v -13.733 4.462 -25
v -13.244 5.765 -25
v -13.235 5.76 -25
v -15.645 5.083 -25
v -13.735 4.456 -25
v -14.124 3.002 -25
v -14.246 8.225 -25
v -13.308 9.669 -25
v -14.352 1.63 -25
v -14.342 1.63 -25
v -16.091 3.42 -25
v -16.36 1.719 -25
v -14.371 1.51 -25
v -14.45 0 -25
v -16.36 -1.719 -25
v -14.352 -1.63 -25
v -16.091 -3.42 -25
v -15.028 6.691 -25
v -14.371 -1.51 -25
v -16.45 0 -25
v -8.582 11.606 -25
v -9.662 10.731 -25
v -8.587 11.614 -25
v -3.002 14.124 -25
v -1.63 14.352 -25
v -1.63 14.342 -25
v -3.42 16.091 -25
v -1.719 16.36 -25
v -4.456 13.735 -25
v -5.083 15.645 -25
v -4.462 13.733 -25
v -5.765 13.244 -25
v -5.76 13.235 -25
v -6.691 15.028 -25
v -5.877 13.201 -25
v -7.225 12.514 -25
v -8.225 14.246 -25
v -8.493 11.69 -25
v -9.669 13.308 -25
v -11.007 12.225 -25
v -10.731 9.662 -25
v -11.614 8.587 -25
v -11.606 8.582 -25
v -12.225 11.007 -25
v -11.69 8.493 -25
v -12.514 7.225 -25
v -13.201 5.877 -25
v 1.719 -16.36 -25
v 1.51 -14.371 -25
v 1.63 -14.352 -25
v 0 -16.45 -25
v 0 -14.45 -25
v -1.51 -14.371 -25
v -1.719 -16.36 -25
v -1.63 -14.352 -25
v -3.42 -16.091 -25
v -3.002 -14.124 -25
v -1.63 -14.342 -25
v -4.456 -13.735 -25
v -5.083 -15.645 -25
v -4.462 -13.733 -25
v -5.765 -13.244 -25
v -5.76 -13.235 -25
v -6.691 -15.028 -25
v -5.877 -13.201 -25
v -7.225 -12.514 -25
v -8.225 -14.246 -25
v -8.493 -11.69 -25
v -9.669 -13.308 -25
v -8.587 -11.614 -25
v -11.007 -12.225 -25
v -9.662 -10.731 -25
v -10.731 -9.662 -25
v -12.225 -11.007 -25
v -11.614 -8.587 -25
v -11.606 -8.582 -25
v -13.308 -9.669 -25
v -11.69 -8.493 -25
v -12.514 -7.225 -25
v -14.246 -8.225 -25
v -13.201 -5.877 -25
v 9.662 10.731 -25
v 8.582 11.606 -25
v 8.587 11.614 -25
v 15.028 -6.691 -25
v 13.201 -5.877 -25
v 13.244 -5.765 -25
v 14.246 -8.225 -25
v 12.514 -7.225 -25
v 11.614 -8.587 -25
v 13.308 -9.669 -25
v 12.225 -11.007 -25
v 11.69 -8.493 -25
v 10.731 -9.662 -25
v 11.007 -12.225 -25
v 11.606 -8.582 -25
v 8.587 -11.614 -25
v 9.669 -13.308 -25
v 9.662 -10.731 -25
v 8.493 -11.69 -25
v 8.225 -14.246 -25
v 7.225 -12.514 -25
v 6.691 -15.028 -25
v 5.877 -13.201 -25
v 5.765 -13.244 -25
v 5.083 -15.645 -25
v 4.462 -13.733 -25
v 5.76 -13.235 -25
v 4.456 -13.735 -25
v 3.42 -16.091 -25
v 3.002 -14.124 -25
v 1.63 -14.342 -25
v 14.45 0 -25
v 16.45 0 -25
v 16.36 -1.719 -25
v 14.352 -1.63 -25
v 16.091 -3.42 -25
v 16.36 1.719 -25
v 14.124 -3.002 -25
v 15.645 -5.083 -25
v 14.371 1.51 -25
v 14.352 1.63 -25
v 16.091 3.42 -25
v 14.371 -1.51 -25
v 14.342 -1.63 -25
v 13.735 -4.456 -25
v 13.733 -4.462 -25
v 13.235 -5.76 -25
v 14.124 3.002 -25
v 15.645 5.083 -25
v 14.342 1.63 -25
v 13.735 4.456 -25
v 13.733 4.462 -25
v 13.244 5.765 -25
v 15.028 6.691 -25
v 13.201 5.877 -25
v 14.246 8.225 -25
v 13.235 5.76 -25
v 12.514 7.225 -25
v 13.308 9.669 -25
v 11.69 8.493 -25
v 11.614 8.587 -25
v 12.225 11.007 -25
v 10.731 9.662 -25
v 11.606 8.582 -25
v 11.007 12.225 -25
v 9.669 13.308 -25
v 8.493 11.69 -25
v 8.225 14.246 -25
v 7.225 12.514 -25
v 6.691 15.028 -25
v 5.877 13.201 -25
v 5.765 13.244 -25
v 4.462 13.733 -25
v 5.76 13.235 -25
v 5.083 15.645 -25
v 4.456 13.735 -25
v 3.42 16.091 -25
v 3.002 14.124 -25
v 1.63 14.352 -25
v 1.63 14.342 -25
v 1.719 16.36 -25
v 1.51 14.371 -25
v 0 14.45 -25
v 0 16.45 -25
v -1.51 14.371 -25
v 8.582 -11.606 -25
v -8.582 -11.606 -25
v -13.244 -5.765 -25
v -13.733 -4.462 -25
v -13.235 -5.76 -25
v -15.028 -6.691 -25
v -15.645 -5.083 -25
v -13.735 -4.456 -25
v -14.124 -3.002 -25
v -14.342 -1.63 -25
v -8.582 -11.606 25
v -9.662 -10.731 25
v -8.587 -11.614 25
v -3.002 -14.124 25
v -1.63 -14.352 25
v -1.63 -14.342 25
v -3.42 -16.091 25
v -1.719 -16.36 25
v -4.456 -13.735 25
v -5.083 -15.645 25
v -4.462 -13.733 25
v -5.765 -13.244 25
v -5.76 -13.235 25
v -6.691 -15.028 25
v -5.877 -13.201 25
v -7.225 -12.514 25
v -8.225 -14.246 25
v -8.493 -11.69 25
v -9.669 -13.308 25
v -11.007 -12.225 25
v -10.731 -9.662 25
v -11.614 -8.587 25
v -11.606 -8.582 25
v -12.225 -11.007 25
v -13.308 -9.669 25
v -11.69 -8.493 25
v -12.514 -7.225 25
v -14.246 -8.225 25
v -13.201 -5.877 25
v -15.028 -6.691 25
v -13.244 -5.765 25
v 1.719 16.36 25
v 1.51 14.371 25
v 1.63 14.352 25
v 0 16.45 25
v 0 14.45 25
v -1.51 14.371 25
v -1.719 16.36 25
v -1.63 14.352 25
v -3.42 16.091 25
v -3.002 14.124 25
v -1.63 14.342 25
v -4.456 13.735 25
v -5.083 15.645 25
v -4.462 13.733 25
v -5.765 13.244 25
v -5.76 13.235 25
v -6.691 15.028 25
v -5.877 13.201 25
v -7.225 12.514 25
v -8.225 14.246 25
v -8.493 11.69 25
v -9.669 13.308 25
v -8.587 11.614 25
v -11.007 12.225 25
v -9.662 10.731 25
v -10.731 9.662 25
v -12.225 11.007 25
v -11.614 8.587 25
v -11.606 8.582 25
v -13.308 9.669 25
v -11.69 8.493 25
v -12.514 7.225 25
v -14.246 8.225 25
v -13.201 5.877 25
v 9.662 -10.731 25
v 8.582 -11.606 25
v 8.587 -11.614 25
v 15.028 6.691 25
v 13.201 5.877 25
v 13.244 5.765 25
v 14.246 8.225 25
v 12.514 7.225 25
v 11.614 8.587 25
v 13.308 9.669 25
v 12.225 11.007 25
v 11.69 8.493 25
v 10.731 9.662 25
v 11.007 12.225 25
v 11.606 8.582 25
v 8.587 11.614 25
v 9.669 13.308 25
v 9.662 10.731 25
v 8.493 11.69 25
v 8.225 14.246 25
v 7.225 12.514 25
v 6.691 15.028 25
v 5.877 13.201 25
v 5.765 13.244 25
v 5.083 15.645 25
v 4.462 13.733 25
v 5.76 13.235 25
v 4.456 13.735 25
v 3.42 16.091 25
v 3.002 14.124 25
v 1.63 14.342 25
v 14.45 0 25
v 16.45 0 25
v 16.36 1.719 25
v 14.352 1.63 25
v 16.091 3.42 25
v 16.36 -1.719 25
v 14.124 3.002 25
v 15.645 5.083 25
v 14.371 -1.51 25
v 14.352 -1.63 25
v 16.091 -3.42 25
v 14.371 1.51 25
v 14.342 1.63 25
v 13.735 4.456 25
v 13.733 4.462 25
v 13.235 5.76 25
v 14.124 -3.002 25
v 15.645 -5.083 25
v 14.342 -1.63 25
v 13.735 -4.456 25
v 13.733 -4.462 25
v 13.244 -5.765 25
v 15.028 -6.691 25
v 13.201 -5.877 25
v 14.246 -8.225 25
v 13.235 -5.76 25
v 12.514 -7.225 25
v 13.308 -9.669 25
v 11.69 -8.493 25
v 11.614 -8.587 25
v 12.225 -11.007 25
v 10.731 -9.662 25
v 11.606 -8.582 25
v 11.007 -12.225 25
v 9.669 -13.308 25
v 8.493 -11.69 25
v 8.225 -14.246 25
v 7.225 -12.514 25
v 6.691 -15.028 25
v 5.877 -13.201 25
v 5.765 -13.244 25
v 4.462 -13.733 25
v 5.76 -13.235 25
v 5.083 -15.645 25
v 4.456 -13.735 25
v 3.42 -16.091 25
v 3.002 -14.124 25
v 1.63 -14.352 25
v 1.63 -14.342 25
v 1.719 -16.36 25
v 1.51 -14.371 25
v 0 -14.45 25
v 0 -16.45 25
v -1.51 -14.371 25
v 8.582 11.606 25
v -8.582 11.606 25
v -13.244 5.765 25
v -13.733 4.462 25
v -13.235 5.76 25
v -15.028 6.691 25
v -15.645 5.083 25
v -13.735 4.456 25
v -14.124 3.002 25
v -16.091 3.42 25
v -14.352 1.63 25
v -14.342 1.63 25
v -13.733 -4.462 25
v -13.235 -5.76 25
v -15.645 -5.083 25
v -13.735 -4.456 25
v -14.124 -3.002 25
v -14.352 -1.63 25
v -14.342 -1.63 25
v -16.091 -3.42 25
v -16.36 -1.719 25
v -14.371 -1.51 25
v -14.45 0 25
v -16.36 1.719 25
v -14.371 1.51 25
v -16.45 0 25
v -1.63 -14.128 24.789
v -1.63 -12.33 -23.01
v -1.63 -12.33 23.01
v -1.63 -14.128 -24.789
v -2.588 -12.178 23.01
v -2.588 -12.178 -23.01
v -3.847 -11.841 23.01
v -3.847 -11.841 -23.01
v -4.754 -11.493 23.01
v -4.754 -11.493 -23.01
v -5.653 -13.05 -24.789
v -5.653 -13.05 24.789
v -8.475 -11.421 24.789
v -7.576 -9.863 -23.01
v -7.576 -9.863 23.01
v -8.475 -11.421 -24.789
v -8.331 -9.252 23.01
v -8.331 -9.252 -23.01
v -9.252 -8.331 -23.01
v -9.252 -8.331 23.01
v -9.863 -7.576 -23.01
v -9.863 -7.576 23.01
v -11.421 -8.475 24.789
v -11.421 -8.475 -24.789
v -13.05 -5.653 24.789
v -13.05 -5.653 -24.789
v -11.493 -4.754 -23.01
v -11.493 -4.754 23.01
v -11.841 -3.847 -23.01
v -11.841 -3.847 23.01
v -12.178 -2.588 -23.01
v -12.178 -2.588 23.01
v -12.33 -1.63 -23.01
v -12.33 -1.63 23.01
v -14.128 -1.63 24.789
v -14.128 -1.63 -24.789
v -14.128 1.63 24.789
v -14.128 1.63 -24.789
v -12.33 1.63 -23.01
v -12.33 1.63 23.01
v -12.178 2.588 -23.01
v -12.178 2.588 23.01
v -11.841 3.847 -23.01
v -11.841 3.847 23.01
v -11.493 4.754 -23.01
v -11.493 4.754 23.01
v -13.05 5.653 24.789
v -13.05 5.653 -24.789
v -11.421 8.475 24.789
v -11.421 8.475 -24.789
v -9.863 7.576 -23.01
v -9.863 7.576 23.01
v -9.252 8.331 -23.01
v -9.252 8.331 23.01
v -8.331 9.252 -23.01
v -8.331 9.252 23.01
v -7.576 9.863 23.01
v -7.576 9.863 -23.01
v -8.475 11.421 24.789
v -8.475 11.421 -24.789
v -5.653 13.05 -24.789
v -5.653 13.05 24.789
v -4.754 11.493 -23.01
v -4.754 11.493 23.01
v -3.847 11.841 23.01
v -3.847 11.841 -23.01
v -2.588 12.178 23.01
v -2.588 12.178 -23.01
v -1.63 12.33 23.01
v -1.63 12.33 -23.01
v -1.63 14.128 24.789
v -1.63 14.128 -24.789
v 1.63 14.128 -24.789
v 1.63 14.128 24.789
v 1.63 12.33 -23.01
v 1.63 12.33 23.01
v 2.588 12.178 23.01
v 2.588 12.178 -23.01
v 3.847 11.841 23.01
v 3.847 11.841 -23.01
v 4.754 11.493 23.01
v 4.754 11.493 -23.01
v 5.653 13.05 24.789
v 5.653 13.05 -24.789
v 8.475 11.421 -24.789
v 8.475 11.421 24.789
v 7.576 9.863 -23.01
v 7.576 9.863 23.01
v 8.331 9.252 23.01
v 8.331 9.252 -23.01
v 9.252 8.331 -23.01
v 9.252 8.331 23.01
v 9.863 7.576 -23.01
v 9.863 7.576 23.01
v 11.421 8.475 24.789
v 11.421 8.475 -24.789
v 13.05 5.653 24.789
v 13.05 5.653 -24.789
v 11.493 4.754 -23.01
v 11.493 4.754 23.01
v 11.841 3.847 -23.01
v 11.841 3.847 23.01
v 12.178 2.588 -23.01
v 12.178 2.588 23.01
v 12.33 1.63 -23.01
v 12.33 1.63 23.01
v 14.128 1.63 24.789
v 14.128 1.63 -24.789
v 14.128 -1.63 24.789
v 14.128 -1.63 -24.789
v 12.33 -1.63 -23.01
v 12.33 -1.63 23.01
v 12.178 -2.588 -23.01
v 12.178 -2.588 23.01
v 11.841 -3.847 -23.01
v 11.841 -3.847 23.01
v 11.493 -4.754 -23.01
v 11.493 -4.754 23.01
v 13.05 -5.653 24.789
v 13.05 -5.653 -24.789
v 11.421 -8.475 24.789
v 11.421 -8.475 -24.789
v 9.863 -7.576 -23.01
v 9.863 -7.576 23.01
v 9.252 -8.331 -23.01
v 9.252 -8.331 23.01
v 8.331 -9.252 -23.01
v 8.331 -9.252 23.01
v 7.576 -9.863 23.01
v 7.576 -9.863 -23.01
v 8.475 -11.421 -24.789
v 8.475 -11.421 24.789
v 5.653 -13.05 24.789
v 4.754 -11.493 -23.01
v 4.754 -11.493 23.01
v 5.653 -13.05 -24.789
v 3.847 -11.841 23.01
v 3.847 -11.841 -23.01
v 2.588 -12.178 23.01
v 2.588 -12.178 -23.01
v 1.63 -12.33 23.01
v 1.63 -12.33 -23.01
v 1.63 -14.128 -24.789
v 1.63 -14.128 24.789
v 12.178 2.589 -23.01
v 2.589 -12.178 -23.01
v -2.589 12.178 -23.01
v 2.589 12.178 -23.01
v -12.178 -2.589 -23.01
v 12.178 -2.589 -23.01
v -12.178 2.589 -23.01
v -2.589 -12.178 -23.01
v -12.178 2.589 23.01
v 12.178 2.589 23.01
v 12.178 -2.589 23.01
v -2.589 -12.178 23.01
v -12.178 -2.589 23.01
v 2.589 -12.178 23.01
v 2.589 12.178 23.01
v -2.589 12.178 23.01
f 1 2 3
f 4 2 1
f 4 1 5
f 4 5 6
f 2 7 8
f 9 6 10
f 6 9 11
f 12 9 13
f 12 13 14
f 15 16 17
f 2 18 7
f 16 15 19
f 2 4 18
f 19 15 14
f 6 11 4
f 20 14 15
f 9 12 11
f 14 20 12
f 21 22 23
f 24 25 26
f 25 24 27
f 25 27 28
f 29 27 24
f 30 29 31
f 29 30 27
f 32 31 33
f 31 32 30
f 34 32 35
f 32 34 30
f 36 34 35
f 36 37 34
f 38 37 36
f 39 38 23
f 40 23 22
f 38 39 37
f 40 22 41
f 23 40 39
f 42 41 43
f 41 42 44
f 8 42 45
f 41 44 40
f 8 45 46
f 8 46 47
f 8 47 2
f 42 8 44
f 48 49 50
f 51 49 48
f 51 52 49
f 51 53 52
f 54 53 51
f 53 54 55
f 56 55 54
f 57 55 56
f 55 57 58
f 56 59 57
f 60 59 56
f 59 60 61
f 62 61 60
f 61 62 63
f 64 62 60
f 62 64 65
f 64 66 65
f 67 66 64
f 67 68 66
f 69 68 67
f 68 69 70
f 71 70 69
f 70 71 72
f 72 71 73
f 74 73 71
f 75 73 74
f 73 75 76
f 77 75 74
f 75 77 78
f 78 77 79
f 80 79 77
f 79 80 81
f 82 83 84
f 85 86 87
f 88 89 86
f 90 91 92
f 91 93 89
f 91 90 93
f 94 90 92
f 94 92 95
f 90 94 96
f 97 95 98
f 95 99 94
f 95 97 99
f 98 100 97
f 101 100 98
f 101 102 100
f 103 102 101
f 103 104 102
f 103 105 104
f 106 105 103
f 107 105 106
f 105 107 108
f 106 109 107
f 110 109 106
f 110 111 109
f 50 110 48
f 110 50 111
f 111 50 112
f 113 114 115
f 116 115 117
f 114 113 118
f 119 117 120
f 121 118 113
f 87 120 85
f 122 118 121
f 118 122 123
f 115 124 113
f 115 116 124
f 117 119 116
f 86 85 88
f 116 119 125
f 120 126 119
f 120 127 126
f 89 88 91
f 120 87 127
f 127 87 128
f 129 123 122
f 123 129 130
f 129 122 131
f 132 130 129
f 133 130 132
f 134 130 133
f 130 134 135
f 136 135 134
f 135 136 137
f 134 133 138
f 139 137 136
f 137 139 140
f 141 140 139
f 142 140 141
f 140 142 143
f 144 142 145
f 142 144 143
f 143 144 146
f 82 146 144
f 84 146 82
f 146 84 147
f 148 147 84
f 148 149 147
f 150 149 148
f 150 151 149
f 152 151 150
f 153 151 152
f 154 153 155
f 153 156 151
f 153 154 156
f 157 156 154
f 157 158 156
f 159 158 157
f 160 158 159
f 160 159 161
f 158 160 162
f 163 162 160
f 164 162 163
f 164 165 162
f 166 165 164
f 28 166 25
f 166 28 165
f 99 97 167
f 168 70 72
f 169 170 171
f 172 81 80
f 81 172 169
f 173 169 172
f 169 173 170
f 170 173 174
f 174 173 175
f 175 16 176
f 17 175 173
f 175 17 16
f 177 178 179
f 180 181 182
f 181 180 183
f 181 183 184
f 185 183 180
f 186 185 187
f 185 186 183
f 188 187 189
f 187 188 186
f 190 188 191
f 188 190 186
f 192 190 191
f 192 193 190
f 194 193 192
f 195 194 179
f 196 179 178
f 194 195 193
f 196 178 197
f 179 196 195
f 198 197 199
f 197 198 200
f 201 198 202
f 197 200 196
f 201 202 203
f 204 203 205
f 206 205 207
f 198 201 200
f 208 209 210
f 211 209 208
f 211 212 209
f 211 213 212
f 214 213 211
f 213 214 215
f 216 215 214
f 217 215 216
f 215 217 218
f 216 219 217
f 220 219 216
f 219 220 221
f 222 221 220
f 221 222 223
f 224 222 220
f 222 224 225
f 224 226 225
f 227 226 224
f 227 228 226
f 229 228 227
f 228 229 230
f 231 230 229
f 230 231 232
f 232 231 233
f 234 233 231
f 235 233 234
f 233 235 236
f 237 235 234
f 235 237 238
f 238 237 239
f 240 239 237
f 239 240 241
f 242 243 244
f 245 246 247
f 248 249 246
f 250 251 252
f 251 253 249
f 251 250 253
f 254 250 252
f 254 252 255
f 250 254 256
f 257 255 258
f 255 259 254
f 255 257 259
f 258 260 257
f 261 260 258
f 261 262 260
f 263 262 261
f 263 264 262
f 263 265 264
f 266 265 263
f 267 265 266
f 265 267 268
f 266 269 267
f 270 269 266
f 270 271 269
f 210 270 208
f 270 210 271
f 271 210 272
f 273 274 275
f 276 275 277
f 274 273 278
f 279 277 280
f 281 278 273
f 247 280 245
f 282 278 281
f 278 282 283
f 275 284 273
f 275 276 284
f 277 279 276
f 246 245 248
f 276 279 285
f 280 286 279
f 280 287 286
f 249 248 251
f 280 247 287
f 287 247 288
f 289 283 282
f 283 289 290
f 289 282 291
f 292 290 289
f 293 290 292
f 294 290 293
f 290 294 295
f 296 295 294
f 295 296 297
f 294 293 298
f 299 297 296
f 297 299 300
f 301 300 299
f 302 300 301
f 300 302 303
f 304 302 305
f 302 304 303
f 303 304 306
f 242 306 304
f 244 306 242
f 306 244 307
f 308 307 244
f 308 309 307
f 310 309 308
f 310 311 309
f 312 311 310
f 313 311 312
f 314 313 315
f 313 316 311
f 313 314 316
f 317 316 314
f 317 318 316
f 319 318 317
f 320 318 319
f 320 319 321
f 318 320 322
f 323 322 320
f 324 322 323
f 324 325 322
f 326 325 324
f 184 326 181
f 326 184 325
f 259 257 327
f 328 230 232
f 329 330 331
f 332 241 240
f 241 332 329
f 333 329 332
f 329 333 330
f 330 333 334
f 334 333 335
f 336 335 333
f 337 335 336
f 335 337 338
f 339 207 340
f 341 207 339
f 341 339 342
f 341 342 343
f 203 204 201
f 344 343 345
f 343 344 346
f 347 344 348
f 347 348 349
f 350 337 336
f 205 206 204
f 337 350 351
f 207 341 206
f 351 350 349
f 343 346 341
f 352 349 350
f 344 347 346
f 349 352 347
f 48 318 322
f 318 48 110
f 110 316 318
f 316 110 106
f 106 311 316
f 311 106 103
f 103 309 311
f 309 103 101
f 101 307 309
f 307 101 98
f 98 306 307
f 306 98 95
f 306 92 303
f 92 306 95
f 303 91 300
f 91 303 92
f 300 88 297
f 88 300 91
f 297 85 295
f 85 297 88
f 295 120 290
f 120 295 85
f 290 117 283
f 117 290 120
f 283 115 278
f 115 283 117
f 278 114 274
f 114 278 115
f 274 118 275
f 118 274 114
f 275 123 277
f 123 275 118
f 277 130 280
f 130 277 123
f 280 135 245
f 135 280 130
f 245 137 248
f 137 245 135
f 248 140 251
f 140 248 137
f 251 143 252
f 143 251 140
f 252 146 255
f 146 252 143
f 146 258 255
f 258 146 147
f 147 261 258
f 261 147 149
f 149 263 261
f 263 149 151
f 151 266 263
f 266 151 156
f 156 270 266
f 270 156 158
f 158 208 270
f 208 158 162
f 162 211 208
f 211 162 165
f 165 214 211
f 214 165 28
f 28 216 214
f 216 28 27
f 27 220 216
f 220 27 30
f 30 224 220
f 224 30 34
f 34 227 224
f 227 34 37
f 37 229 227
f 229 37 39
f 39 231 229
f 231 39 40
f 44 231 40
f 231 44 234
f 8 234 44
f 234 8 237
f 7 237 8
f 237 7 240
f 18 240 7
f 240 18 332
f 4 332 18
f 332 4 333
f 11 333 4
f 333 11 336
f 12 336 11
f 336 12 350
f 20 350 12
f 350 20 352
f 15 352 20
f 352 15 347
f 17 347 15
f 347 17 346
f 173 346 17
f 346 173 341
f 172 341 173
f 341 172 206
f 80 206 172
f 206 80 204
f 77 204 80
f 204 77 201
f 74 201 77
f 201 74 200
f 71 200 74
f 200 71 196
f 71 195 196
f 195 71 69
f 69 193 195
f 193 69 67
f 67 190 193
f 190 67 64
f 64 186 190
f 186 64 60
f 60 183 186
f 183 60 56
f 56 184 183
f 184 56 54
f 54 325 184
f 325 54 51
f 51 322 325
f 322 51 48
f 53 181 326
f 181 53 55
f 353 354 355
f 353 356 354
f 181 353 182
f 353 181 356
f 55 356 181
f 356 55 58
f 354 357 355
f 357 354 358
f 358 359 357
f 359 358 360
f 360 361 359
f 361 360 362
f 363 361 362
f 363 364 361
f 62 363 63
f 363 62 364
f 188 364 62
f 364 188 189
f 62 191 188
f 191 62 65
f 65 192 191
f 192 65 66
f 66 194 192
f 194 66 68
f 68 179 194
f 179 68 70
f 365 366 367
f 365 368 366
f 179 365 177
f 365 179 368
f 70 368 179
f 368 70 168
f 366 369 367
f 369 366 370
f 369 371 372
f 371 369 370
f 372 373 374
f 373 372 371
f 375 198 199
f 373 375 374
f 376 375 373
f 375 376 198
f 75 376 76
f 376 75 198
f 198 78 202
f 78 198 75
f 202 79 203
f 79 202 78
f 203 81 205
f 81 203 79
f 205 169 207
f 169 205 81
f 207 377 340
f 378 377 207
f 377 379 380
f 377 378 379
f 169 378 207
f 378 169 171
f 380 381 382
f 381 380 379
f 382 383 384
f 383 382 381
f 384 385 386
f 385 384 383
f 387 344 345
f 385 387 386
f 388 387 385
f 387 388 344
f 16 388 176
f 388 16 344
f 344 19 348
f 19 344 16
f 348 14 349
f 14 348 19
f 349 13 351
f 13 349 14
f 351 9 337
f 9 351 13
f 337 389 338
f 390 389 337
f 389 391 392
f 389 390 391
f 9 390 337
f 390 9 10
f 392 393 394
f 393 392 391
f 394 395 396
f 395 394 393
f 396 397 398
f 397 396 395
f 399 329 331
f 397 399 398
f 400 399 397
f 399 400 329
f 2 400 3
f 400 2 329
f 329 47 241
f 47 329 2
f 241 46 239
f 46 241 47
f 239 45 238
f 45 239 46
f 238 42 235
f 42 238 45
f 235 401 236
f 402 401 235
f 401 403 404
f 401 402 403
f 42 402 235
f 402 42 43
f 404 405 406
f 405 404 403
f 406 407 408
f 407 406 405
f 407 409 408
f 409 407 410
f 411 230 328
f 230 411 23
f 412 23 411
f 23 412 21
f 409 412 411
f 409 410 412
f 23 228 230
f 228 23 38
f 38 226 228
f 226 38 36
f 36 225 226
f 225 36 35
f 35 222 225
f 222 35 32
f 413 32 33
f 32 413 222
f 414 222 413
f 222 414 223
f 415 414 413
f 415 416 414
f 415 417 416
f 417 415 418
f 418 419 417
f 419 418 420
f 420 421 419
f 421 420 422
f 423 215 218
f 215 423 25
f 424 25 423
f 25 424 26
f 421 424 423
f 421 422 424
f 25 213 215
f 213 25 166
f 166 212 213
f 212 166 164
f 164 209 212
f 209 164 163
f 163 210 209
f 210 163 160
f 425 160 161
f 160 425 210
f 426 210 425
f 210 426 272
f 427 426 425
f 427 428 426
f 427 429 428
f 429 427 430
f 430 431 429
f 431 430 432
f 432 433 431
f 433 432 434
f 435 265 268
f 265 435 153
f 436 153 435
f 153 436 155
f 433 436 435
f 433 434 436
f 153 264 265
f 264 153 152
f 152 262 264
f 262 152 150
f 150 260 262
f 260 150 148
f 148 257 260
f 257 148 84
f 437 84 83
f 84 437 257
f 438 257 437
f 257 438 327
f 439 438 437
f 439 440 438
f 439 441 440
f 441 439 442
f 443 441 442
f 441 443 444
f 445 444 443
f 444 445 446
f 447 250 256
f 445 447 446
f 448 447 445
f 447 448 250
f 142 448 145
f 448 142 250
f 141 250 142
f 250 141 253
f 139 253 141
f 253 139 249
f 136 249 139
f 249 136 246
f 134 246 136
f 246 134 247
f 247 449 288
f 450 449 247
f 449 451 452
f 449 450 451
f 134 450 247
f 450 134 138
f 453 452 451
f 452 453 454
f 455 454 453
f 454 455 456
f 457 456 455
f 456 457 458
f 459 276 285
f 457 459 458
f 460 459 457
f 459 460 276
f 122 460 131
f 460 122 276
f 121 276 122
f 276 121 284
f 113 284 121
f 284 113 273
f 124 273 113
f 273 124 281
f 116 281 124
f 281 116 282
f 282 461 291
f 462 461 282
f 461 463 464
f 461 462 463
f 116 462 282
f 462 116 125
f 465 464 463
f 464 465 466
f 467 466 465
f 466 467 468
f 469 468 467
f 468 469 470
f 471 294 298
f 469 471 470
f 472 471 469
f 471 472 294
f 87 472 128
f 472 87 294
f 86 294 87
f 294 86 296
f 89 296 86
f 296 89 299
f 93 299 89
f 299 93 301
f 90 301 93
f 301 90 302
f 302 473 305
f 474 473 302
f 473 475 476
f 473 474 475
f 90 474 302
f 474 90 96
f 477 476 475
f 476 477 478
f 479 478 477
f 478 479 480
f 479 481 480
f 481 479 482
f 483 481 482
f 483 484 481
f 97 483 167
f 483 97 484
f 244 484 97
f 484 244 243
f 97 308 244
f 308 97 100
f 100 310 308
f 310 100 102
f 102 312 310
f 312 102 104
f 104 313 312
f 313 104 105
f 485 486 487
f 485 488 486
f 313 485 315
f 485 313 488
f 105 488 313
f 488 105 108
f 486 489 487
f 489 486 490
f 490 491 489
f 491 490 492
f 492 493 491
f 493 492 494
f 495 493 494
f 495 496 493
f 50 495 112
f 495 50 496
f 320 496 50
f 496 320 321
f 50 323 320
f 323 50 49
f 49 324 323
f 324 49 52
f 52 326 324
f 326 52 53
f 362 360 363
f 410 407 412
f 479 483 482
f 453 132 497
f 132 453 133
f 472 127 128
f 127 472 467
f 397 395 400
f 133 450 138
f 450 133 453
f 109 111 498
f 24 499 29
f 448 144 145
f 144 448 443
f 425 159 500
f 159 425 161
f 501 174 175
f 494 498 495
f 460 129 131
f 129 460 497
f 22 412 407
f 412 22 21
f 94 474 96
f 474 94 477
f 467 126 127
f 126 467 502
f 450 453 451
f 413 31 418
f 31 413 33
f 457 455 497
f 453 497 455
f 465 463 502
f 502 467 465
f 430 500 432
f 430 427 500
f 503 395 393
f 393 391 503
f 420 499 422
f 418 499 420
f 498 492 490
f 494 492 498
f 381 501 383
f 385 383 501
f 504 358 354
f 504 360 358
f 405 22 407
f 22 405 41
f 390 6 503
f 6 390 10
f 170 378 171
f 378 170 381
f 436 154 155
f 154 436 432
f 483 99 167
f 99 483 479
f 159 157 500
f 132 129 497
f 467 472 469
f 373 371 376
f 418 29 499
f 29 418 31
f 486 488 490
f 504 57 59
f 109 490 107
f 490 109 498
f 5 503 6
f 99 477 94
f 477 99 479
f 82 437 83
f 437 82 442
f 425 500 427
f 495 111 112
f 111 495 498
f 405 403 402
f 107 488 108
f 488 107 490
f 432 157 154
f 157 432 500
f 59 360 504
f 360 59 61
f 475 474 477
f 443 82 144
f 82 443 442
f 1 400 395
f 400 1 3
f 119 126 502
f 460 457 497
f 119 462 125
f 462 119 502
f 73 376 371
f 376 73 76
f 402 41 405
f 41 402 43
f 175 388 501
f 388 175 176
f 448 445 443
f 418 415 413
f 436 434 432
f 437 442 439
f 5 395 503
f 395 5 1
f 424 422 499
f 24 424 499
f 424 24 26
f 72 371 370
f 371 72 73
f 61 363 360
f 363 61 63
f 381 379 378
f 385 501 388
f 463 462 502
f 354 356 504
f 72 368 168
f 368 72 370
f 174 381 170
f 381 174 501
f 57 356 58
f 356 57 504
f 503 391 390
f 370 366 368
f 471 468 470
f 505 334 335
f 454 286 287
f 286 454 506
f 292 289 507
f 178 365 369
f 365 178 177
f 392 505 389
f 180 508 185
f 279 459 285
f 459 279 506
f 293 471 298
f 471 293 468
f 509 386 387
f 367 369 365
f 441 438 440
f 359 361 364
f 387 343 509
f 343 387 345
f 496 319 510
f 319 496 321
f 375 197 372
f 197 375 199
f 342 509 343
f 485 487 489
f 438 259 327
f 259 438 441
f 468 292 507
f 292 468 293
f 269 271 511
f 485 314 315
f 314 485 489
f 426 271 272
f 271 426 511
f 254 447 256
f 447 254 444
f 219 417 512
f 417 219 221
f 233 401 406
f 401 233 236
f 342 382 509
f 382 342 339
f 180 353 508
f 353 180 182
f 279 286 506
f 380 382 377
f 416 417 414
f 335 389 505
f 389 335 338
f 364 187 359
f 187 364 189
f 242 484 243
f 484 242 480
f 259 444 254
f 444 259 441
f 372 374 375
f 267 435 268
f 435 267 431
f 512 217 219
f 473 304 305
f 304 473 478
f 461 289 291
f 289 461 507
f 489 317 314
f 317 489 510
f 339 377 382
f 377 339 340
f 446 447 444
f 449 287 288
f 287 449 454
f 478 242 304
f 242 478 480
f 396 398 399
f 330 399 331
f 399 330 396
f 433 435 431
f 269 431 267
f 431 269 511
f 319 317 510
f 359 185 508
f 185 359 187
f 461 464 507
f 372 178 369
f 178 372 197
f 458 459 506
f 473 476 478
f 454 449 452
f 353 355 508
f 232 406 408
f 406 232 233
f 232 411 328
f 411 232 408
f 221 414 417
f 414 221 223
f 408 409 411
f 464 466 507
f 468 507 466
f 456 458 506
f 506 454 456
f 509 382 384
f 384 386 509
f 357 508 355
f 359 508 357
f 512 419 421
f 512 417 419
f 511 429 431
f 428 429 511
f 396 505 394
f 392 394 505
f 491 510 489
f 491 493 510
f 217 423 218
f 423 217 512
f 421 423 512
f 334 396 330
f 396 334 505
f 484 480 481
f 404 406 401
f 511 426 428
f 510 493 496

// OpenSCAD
/* [Bushing] */

// The outer diameter of the bushing
BUSHING_DIAMETER = 32.9;

// The height of the bushing
BUSHING_HEIGHT = 50;

// Thickness of the wall
BUSHING_WALL = 2;

// Radius of the chamfer
BUSHING_CHAMFER = 2;

/* [Rod] */

// Diameter of the linear smooth rod
ROD_DIAMETER = 24.9;

// The amount of pins connecting to the rod
ROD_PINS = 12; // [3:100]

// Percentage of rod circumference covered by pins
ROD_PIN_COVERAGE = 0.5; // [0:0.01:1.01]

module dummy() {};
$fa = $preview? 12 : 6;
$fs = $preview? 2 : 0.2;
EPS = 0.01;

module rod_negative_sketch(
    inner_radius=ROD_DIAMETER/2,
    outer_radius=1.2 * ROD_DIAMETER/2,
    pins=ROD_PINS,
    pin_coverage=1-ROD_PIN_COVERAGE
) {
    assert(pin_coverage <= 1);
    assert(pin_coverage >= 0);
    assert(pins >= 3);
    
    pin_width = 2 * PI * inner_radius * pin_coverage / pins;
    pin_length = outer_radius;
   
    // create the rod
    circle(r=inner_radius);
    
    // create the pins
    intersection() {
        // pins
        for(a=[0:360/pins:360])
            rotate(a)
                translate([0,-pin_width/2])
                    square([pin_length, pin_width]);
        // round over pin ends
        circle(outer_radius);
    }
}

module bushing_sketch(
    outer_radius=BUSHING_DIAMETER/2,
    inner_radius=ROD_DIAMETER/2,
    wall=BUSHING_WALL,
    pins=ROD_PINS,
    pin_coverage=ROD_PIN_COVERAGE
) {

    assert(inner_radius + wall < outer_radius);

    difference() {
        
        // the bushing
        circle(outer_radius);
        
        // the rod cutout
        rod_negative_sketch(
            inner_radius=inner_radius,
            outer_radius=outer_radius - wall,
            pins=pins,
            pin_coverage=1-pin_coverage);
    }
}

module bushing(
    outer_radius=BUSHING_DIAMETER/2,
    inner_radius=ROD_DIAMETER/2,
    height=BUSHING_HEIGHT,
    wall=BUSHING_WALL,
    pins=ROD_PINS,
    pin_coverage=ROD_PIN_COVERAGE,
    chamfer_height=BUSHING_CHAMFER
) {
    
    module chamfer_cone() {
        cylinder(chamfer_height, r1=chamfer_height + inner_radius, r2=inner_radius);    
    }
    
    difference() {
        // the bushing
        linear_extrude(height, center=true)
            bushing_sketch(
                outer_radius=outer_radius,
                inner_radius=inner_radius,
                wall=wall,
                pins=pins,
                pin_coverage=pin_coverage    
            );
        
        // bottom chamfer
        translate([0,0,-height/2-EPS]) chamfer_cone();

        // top chamfer
        translate([0,0,height/2+EPS]) rotate([180,0,0]) chamfer_cone();
    }
    
}


bushing();
